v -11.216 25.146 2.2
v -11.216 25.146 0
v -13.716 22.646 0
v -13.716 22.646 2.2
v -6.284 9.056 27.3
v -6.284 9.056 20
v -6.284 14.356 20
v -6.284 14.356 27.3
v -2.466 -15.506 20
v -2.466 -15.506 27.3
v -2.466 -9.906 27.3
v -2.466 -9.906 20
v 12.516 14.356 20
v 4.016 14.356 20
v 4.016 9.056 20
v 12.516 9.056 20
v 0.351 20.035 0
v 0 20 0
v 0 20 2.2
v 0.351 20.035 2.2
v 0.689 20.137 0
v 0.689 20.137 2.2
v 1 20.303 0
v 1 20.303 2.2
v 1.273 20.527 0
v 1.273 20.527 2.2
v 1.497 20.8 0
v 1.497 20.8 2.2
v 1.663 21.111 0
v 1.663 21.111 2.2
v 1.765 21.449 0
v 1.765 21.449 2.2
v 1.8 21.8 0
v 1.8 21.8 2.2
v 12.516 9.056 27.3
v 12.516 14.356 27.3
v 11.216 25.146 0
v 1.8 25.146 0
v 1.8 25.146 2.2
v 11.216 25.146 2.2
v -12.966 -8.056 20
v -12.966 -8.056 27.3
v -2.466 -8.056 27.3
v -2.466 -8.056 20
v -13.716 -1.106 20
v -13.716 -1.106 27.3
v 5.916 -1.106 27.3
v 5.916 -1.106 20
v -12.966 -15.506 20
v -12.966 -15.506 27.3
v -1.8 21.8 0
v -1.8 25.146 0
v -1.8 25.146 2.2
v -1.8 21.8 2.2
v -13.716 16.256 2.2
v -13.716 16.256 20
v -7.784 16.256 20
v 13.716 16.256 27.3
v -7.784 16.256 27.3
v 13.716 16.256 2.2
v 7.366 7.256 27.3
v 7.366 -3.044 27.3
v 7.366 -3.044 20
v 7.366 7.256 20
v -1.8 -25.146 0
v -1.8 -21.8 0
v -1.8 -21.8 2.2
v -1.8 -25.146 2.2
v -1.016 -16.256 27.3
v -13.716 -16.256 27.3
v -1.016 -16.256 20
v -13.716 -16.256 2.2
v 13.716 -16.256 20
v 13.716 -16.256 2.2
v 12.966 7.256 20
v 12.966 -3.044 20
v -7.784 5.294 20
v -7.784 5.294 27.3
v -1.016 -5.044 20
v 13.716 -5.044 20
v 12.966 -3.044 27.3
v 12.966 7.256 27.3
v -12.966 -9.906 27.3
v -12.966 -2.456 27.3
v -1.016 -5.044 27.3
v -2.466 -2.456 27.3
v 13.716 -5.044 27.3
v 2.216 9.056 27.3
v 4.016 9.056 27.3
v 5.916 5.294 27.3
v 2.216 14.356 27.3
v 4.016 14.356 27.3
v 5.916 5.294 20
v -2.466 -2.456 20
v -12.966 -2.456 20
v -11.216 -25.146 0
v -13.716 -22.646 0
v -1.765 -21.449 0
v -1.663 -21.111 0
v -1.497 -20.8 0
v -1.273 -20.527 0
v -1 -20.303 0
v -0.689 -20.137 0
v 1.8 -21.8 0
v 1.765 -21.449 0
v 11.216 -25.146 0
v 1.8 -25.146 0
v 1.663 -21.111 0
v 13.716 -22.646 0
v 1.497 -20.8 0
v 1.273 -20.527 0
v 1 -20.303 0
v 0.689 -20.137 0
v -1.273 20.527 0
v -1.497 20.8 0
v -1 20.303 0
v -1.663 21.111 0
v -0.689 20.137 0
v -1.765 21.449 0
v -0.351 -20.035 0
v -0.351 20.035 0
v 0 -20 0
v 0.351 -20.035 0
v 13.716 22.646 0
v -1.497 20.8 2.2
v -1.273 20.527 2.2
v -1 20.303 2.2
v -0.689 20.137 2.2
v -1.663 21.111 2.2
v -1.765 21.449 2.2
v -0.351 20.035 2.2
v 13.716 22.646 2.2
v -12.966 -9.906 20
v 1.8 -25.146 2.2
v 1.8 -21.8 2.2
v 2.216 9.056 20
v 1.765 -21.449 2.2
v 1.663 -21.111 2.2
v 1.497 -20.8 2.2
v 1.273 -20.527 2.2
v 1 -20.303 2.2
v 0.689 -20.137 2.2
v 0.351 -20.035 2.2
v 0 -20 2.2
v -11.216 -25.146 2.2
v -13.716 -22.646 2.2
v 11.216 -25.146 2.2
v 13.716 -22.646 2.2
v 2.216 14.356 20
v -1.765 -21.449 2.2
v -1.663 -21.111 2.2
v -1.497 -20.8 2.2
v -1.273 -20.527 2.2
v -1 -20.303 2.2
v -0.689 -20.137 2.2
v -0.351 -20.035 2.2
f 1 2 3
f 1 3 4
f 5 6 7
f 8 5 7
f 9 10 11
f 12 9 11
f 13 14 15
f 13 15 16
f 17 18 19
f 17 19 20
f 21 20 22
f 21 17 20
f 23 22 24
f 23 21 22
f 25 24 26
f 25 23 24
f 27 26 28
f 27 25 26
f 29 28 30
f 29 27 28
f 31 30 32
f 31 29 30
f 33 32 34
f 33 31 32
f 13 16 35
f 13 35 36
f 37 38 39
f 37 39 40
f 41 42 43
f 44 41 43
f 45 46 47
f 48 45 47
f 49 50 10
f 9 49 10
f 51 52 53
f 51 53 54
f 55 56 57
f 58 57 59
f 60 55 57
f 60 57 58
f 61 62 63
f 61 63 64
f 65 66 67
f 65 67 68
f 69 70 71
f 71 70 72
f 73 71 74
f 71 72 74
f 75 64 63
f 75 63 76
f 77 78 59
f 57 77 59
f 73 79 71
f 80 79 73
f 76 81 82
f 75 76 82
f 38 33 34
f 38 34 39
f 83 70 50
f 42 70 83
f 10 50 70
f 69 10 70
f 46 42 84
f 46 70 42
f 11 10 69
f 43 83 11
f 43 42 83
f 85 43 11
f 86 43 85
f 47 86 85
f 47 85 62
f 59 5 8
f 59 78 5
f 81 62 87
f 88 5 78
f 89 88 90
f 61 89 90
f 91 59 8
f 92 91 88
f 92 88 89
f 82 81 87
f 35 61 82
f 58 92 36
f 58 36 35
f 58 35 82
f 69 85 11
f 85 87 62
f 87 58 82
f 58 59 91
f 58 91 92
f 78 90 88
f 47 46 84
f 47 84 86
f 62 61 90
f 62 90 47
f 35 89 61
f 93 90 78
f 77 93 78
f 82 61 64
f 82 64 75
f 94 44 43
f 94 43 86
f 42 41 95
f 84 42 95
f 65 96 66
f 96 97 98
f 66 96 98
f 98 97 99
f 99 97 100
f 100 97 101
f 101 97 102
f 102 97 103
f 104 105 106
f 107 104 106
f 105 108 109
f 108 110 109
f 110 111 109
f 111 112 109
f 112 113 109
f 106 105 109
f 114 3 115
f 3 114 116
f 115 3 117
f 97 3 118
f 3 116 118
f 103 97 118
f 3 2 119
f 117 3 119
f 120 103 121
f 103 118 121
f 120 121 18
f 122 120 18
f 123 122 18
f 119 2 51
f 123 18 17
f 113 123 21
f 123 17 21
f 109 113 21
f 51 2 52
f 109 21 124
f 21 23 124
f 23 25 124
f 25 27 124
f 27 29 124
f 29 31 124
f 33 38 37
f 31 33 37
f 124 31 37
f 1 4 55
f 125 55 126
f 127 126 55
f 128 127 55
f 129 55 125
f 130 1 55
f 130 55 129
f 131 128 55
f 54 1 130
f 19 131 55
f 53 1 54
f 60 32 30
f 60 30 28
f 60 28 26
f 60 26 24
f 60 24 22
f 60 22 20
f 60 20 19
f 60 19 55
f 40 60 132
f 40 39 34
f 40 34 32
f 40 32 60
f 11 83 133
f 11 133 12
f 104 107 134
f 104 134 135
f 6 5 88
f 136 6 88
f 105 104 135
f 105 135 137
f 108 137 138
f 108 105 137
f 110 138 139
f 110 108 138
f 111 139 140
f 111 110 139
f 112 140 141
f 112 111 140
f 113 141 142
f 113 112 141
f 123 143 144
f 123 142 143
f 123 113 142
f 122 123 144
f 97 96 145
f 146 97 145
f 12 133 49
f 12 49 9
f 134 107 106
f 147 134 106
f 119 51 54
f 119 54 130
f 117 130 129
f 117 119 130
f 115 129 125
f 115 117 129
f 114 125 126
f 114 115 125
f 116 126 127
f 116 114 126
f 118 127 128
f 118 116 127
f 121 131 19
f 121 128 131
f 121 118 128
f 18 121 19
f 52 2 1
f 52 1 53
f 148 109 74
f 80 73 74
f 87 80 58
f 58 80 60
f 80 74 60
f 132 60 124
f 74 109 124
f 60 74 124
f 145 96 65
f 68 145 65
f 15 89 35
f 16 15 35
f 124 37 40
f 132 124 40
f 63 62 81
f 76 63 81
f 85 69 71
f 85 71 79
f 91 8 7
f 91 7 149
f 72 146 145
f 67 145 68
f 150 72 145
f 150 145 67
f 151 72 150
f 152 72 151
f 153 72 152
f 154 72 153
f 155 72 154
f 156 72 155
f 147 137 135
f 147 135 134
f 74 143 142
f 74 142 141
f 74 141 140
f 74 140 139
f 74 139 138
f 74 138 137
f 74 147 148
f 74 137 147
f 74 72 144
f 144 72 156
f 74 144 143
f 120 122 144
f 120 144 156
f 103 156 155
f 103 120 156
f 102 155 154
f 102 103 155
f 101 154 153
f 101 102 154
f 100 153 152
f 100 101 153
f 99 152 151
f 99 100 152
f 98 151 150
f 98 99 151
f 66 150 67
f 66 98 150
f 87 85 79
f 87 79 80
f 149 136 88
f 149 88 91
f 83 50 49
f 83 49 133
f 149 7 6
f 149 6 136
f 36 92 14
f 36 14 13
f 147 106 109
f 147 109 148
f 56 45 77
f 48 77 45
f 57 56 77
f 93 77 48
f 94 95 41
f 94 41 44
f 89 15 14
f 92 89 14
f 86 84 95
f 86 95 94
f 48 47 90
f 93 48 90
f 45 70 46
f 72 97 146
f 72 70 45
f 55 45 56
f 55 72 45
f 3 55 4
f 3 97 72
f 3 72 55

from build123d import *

# Parameters (mm, degrees)
F0_W     = 27.432
F0_H     = 32.512
F1_DEPTH = 27.3
F0_H_2   = 8.89
F2_DEPTH = 2.2
F3_SIZE  = 2.5
F4_W     = 14.732
F4_H     = 11.212
F5_DEPTH = 7.3
F6_W     = 8.5
F6_H     = 5.3
F6_W_2   = 5.6
F6_H_2   = 10.3
F6_W_3   = 10.5
F6_H_3   = 5.6
F7_DEPTH = 7.3
F9_DEPTH = 27.301


with BuildPart() as f1:
    # F0 (on Top) → F1 (new body)
    with BuildSketch(Plane.XY):
        Rectangle(F0_W, F0_H)
    extrude(amount=F1_DEPTH)

    # F0 (on Top) → F2 (join)
    with BuildSketch(Plane.XY):
        with Locations((0, 20.701)):
            Rectangle(F0_W, F0_H_2)
        with Locations((0, -20.701)):
            Rectangle(F0_W, F0_H_2)
    extrude(amount=F2_DEPTH)

    # F3
    f3_edges = [f1.edges().sort_by_distance(p)[0] for p in [
        (-13.716, -25.146, 1.1),
        (13.716, -25.146, 1.1),
        (13.716, 25.146, 1.1),
        (-13.716, 25.146, 1.1),
    ]]
    chamfer(f3_edges, length=F3_SIZE)

    # F4 (on face) → F5 (cut)
    with BuildSketch(Plane.XY.offset(27.3)):
        with Locations((6.35, -10.65)):
            Rectangle(F4_W, F4_H)
        Polygon((-13.716, 16.256), (-13.716, -1.106), (5.916, -1.106), (5.916, 5.294), (-7.784, 5.294), (-7.784, 16.256), align=None)
    extrude(amount=-F5_DEPTH, mode=Mode.SUBTRACT)

    # F6 (on face) → F7 (cut)
    with BuildSketch(Plane.XY.offset(27.3)):
        with Locations((-2.034, 11.706)):
            Rectangle(F6_W, F6_H)
        with Locations((8.266, 11.706)):
            Rectangle(F6_W, F6_H)
        with Locations((10.166, 2.106)):
            Rectangle(F6_W_2, F6_H_2)
        with Locations((-7.716, -12.706)):
            Rectangle(F6_W_3, F6_H_3)
        with Locations((-7.716, -5.256)):
            Rectangle(F6_W_3, F6_H_3)
    extrude(amount=-F7_DEPTH, mode=Mode.SUBTRACT)

    # F8 (on face) → F9 (cut, through all)
    with BuildSketch(Plane.XY):
        with BuildLine():
            Line((-1.8, -25.146), (0, -25.146))
            Line((0, -25.146), (1.8, -25.146))
            Line((1.8, -25.146), (1.8, -21.8))
            ThreePointArc((1.8, -21.8), (1.272792, -20.527208), (0, -20))
            ThreePointArc((0, -20), (-1.272792, -20.527208), (-1.8, -21.8))
            Line((-1.8, -21.8), (-1.8, -25.146))
        make_face()
        with BuildLine():
            Line((1.8, 25.146), (0, 25.146))
            Line((0, 25.146), (-1.8, 25.146))
            Line((-1.8, 25.146), (-1.8, 21.8))
            ThreePointArc((-1.8, 21.8), (-1.272792, 20.527208), (0, 20))
            ThreePointArc((0, 20), (1.272792, 20.527208), (1.8, 21.8))
            Line((1.8, 21.8), (1.8, 25.146))
        make_face()
    extrude(amount=F9_DEPTH, mode=Mode.SUBTRACT)


solid = f1.part
